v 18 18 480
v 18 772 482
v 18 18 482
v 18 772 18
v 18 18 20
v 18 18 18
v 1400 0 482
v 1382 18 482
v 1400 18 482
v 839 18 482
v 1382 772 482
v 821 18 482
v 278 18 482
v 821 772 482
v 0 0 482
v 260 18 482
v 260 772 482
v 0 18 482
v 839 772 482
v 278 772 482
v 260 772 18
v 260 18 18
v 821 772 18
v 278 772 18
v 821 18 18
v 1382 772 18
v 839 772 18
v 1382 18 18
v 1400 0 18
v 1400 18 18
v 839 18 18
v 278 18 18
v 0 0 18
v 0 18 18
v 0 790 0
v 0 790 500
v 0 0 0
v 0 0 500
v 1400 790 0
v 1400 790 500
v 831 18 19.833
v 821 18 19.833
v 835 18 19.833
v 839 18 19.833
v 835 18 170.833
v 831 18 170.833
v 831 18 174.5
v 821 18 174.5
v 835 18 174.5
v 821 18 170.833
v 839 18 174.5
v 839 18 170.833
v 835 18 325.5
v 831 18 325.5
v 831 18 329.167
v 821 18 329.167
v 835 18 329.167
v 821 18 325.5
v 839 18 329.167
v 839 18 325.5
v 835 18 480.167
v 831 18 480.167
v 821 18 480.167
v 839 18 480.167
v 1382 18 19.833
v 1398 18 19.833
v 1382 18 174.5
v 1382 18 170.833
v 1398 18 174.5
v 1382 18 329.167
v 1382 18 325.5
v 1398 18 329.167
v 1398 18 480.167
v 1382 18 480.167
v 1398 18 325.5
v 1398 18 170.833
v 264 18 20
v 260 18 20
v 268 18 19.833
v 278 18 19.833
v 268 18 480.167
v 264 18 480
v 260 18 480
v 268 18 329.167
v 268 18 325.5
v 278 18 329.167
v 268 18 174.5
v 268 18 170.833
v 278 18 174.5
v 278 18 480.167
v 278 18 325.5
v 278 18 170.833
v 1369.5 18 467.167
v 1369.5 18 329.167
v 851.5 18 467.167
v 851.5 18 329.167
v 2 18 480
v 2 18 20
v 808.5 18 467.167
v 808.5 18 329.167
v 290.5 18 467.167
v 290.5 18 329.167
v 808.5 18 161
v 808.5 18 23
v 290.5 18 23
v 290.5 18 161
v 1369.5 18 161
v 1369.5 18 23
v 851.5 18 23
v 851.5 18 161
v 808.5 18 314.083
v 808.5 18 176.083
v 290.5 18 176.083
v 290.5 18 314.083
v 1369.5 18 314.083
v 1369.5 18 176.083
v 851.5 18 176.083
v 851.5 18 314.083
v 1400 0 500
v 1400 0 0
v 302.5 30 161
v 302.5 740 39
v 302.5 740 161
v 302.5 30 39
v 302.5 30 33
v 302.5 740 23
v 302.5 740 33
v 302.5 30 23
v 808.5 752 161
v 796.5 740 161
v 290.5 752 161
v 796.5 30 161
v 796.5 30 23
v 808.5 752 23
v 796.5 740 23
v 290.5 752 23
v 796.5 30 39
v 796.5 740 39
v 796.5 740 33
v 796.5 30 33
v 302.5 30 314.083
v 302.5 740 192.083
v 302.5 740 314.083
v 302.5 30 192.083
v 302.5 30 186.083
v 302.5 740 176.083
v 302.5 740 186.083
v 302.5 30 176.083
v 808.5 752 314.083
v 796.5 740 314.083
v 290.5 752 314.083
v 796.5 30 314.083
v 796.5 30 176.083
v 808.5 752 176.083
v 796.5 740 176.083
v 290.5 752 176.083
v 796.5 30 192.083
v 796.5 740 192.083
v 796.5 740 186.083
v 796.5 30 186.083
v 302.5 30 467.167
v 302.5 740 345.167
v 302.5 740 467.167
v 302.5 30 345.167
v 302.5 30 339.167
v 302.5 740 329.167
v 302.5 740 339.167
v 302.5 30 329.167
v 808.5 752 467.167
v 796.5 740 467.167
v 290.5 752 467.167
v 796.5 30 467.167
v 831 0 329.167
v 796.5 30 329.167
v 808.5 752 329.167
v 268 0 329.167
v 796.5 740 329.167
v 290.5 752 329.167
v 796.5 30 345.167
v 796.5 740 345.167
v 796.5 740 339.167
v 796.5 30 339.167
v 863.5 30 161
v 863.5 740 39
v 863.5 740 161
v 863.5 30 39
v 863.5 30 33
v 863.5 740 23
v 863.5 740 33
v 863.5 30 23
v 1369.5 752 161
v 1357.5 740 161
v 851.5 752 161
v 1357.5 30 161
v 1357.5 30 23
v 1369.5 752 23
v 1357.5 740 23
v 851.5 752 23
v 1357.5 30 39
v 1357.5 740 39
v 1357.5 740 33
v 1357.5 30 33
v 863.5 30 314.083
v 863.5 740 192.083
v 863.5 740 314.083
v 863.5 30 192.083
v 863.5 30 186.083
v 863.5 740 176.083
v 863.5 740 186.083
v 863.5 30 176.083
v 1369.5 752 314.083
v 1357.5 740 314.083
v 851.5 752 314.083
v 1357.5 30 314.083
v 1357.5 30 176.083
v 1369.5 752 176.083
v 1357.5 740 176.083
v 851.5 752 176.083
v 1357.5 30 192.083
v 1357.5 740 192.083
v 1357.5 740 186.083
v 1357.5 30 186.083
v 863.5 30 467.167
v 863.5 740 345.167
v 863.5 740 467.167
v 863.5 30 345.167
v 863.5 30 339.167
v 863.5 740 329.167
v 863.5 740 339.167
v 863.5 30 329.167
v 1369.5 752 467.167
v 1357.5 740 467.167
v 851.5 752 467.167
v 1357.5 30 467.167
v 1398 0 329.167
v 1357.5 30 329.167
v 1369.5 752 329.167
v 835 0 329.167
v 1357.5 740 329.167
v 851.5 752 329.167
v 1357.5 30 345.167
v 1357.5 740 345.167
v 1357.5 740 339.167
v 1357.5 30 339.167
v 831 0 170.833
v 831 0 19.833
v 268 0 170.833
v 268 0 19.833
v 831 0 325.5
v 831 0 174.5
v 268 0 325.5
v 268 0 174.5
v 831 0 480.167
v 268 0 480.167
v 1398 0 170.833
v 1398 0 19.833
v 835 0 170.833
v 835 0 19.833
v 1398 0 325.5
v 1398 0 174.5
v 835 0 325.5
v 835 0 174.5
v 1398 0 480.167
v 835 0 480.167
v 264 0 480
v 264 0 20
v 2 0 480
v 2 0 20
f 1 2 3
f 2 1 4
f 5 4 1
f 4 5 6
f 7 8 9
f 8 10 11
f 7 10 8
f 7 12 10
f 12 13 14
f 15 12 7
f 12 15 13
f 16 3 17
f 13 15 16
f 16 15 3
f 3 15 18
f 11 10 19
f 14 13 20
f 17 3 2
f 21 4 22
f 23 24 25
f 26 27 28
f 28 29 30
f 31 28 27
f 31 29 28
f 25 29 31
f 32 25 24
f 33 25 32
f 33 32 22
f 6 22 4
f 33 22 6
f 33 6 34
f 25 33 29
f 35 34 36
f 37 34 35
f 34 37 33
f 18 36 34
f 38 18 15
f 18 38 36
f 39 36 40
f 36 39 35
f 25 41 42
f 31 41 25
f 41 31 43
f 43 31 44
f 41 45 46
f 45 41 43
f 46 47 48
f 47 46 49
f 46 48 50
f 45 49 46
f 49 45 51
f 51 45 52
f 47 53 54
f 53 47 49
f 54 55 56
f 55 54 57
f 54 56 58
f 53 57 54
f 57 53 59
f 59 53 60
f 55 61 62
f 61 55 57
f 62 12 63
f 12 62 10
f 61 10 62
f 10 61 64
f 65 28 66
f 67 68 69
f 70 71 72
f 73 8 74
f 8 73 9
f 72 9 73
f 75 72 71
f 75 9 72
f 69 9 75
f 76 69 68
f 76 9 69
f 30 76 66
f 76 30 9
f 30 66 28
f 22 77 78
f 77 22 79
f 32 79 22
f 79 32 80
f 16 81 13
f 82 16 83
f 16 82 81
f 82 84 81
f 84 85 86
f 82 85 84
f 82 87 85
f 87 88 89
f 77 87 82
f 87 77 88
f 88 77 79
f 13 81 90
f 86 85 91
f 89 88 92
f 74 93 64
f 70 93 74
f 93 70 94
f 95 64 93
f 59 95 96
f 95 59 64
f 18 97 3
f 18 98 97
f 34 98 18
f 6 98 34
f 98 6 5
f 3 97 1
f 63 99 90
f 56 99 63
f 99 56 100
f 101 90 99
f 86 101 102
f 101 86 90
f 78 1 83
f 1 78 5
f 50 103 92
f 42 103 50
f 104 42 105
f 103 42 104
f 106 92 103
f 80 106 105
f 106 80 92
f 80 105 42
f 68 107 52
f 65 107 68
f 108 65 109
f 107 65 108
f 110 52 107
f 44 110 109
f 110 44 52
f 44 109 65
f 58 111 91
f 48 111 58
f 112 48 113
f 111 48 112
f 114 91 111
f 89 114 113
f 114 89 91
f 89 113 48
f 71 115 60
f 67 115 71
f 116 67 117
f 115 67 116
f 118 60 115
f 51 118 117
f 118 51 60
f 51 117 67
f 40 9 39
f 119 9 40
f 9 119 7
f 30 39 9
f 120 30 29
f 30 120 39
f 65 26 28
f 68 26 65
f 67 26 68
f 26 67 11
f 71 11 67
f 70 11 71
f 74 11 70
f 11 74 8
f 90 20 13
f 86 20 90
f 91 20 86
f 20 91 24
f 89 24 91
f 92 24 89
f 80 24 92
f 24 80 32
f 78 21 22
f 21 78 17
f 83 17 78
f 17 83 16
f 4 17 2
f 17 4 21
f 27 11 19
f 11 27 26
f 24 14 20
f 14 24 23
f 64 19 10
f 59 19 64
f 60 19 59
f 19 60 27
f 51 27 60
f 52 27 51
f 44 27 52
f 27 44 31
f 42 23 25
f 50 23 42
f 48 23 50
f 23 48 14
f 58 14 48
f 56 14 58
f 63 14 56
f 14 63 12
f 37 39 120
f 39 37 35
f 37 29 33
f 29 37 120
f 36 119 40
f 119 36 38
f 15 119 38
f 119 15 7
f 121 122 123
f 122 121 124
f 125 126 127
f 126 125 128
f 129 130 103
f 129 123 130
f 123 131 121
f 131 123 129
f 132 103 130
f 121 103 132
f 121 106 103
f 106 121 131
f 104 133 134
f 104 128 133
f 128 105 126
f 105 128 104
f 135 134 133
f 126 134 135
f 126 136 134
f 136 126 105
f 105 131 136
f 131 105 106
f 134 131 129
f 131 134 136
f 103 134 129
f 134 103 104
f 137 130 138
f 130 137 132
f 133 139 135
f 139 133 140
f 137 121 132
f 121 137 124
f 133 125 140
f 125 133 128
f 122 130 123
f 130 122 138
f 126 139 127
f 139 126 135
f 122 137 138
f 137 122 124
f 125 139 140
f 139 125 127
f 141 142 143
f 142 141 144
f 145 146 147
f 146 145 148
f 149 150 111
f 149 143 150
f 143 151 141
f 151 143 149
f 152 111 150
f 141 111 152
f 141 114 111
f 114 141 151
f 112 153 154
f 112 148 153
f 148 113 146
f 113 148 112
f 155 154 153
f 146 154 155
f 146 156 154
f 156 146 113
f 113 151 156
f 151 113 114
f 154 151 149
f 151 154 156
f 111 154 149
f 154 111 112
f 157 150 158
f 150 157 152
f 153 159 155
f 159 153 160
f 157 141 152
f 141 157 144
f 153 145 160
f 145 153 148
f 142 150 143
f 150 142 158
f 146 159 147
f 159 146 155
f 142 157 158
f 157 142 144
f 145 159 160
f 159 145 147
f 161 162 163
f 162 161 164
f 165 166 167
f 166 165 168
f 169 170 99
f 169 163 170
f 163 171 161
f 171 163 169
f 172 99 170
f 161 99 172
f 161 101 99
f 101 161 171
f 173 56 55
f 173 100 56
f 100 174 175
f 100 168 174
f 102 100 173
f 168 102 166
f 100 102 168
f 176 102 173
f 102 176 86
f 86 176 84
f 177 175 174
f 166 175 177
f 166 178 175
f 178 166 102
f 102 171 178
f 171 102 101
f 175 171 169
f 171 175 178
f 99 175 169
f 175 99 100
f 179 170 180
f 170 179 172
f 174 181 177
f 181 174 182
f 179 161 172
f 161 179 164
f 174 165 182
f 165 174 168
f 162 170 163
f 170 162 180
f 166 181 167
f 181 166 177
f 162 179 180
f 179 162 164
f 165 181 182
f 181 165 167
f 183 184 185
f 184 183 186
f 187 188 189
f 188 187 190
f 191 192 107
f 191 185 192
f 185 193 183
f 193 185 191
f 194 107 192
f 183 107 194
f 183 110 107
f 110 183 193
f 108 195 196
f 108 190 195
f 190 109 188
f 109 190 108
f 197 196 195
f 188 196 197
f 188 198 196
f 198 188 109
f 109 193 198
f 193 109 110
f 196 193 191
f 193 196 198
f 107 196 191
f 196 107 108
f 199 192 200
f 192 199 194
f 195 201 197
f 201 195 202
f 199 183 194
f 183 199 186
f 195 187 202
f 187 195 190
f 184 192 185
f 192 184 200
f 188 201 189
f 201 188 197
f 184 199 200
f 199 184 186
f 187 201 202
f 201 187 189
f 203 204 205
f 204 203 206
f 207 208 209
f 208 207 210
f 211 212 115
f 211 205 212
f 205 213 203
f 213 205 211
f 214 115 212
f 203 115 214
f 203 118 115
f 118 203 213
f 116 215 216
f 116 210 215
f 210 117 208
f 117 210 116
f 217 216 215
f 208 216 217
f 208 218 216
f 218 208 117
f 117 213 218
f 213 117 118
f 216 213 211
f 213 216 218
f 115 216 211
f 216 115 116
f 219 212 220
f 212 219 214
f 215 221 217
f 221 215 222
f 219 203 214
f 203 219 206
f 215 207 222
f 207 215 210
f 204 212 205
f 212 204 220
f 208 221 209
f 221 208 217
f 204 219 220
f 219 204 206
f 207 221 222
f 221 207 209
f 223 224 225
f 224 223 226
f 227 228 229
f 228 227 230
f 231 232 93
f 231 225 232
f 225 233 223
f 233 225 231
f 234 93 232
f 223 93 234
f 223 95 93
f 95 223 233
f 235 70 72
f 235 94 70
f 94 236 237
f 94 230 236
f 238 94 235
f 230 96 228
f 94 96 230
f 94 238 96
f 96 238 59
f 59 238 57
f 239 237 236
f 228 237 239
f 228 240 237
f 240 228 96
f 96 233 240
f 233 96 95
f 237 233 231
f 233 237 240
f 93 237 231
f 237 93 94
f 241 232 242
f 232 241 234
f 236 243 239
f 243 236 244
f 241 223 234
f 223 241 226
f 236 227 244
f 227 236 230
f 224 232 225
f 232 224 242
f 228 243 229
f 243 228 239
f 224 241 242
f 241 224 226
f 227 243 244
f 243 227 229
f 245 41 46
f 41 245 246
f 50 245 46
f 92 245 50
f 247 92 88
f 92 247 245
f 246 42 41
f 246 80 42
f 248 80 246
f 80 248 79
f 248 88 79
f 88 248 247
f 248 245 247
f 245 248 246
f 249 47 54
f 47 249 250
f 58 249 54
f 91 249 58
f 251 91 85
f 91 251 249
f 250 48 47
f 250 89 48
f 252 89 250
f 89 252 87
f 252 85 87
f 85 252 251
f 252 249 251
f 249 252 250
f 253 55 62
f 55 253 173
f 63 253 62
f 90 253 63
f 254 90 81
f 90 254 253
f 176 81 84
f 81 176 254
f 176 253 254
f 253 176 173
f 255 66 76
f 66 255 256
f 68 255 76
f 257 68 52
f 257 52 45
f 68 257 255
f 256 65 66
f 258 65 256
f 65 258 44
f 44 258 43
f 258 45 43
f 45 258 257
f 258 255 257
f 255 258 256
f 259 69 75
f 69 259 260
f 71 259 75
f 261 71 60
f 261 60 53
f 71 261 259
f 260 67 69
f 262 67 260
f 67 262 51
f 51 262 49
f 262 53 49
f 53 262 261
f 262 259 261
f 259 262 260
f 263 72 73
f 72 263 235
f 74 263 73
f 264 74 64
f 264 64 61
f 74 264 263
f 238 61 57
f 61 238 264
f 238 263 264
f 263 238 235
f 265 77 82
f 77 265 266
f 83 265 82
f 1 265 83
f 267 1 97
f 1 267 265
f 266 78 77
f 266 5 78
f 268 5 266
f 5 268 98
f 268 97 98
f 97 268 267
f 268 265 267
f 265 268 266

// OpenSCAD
// Lowboard: 3 compartments side by side with 3 drawers each.
// All logic (layout, model, parts list) comes from cupboard-library.scad,
// only the differing parameters are overridden here.
include <../../library/cupboard.scad>

width = 1400;
depth = 790;
height = 500;
wheelHeight = 0; // no wheels; enter wheel height if needed (height includes wheels)

compartments = 3;
// A heavy laser (1140 mm wide) sits on top, flush with the right edge. The left
// face of the first divider lies exactly under the laser's left edge, so the
// divider carries the load. The two right compartments share the remaining width.
// (The laser width is written inline: a new variable defined here would not yet
// exist where compartmentWidths is first assigned in the library.)
compartmentWidths = [width - 1140 - thickness, undef, undef];
smallDrawers = 3;
largeDrawers = 0;
// Drawers per compartment: true = default layout (smallDrawers / largeDrawers),
// false = no drawers
compartmentDrawers = [false, true, true];
// Compartments without drawers get a door (double door above doorMaxWidth)
hasDoor = true;

drawerEnclosed = true;

cupboard();
partsList();
